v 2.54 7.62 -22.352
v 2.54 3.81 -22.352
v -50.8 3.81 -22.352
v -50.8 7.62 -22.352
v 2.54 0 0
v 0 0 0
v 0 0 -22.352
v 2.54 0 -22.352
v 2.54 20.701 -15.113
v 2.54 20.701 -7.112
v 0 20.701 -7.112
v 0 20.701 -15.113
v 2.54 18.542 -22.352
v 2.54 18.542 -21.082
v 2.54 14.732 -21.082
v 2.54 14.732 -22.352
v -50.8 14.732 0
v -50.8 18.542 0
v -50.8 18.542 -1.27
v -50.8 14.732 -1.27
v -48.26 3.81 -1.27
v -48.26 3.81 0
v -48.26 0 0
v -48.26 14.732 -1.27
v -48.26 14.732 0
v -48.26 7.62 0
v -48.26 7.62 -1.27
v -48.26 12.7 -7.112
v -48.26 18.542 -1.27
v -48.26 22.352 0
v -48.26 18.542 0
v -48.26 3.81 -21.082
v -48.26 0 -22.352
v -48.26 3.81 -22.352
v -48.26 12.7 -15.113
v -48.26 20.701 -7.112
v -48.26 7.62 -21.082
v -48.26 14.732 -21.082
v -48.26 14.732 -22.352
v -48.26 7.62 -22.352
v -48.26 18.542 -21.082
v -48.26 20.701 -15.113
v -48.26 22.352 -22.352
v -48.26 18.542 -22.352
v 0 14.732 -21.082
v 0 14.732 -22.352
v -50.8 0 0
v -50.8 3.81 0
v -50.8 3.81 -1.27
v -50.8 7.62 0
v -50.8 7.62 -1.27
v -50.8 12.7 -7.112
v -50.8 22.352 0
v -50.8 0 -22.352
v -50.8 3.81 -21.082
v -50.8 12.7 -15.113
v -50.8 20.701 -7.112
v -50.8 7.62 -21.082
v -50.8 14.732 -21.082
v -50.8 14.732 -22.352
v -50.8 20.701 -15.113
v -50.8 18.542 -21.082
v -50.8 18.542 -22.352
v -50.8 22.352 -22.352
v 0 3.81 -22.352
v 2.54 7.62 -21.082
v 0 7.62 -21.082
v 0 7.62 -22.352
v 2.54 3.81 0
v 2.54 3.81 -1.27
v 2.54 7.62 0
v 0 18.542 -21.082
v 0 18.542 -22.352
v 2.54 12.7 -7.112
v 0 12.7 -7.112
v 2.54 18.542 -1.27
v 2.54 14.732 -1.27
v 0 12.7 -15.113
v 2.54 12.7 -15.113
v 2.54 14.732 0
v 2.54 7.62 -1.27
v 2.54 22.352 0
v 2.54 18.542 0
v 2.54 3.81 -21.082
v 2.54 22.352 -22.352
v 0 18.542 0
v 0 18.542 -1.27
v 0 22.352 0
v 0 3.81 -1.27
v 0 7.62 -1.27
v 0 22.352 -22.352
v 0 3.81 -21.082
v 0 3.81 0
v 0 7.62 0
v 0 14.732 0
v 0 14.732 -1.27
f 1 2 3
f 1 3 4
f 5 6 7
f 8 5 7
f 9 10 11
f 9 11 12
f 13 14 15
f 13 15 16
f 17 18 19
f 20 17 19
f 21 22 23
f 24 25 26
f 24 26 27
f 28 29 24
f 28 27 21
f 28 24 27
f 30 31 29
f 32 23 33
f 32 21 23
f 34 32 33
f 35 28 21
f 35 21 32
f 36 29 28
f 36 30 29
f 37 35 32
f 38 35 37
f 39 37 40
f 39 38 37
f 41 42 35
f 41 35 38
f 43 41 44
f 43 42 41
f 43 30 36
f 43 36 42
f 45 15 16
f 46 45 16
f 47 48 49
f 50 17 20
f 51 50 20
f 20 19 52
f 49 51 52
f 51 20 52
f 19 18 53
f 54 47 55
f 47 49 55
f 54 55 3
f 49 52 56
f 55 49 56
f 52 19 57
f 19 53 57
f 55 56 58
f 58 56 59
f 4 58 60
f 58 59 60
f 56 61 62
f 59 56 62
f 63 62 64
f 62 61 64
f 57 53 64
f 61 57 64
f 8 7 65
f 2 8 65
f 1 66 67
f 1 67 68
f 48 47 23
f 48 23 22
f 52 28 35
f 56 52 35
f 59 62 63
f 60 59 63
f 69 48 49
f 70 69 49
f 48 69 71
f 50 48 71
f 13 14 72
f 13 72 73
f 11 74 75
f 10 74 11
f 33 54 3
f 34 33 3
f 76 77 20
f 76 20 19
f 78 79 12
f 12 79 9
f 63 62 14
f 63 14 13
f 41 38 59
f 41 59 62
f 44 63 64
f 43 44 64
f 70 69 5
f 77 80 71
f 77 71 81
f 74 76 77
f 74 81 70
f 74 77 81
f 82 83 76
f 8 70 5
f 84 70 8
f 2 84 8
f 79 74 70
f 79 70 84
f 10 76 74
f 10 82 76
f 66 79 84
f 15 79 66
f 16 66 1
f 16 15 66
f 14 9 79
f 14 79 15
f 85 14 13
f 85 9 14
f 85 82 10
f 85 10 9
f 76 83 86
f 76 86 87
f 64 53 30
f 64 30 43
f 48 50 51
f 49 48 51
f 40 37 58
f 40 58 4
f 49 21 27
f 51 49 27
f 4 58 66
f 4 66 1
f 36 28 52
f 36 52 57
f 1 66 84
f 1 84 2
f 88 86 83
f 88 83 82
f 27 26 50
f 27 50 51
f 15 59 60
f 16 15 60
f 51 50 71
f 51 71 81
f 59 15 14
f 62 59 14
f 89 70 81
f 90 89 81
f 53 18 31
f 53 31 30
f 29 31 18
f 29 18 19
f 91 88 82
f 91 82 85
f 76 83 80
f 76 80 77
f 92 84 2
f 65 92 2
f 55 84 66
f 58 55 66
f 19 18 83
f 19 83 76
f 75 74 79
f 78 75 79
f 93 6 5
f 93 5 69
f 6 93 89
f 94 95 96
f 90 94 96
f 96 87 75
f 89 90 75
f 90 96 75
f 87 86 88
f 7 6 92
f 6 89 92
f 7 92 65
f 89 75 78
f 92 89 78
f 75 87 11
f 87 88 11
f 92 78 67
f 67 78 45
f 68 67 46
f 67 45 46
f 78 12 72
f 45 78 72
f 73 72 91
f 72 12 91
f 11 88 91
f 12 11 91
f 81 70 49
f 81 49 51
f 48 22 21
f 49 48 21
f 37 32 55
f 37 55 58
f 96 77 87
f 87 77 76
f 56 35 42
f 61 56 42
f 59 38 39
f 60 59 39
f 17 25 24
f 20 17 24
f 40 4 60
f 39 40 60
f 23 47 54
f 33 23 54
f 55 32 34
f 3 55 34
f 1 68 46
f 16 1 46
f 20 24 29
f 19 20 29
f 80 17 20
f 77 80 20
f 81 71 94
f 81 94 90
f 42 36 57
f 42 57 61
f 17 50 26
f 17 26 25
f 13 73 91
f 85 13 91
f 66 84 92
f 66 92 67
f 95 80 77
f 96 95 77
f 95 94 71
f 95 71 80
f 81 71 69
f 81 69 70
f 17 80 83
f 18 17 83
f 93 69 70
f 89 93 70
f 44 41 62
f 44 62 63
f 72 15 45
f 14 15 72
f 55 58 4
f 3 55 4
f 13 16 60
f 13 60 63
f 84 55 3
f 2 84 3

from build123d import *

# Parameters (mm, degrees)
SKETCH1_W             = 22.352
SKETCH1_H             = 22.352
BOSS_EXTRUDE1_DEPTH   = 2.54
LPATTERN1_COUNT       = 2
LPATTERN1_PITCH       = 50.8
SKETCH2_W             = 8.001
SKETCH2_H             = 8.001
SKETCH2_W_2           = 1.27
SKETCH2_H_2           = 3.81
CUT_EXTRUDE1_DEPTH    = 63.003059666
SKETCH3_W             = 1.27
SKETCH3_H             = 3.81
BOSS_EXTRUDE2_DEPTH   = 53.34
BOSS_EXTRUDE2_2_DEPTH = 53.34
BOSS_EXTRUDE2_3_DEPTH = 53.34
BOSS_EXTRUDE2_4_DEPTH = 53.34


with BuildPart() as part:
    # Sketch1 → Boss-Extrude1 (new body)
    with BuildSketch(Plane(origin=(0, 0, 0), x_dir=(0, 0, -1), z_dir=(1, 0, 0))):
        with Locations((11.176, 11.176)):
            Rectangle(SKETCH1_W, SKETCH1_H)
    extrude(amount=BOSS_EXTRUDE1_DEPTH)


with BuildPart() as lpattern1_1:
    # LPattern1: pattern copy
    add(part.part.moved(Location(Vector(-1, 0, 0) * (1 * LPATTERN1_PITCH))))


with BuildPart() as cut_extrude1_tool:
    # Sketch2 → Cut-Extrude1 (new, through all)
    with BuildSketch(Plane(origin=(2.54, 0, 0), x_dir=(0, 0, -1), z_dir=(1, 0, 0))):
        with Locations((11.1125, 16.7005)):
            Rectangle(SKETCH2_W, SKETCH2_H)
        with Locations((0.635, 16.637)):
            Rectangle(SKETCH2_W_2, SKETCH2_H_2)
        with Locations((21.717, 16.637)):
            Rectangle(SKETCH2_W_2, SKETCH2_H_2)
        with Locations((21.717, 5.715)):
            Rectangle(SKETCH2_W_2, SKETCH2_H_2)
        with Locations((0.635, 5.715)):
            Rectangle(SKETCH2_W_2, SKETCH2_H_2)
    extrude(amount=-CUT_EXTRUDE1_DEPTH)


with BuildPart() as part_1:
    add(part.part)

    # Cut-Extrude1: cut by cut_extrude1_tool
    add(cut_extrude1_tool.part, mode=Mode.SUBTRACT)


with BuildPart() as lpattern1_1_1:
    add(lpattern1_1.part)

    # Cut-Extrude1: cut by cut_extrude1_tool
    add(cut_extrude1_tool.part, mode=Mode.SUBTRACT)


with BuildPart() as body_3:
    # Sketch3 → Boss-Extrude2 (new body)
    with BuildSketch(Plane(origin=(2.54, 0, 0), x_dir=(0, 0, -1), z_dir=(1, 0, 0))):
        with Locations((0.635, 16.637)):
            Rectangle(SKETCH3_W, SKETCH3_H)
    extrude(amount=-BOSS_EXTRUDE2_DEPTH)


with BuildPart() as body_4:
    # Sketch3 → Boss-Extrude2 2 (new body)
    with BuildSketch(Plane(origin=(2.54, 0, 0), x_dir=(0, 0, -1), z_dir=(1, 0, 0))):
        with Locations((0.635, 5.715)):
            Rectangle(SKETCH3_W, SKETCH3_H)
    extrude(amount=-BOSS_EXTRUDE2_2_DEPTH)


with BuildPart() as body_5:
    # Sketch3 → Boss-Extrude2 3 (new body)
    with BuildSketch(Plane(origin=(2.54, 0, 0), x_dir=(0, 0, -1), z_dir=(1, 0, 0))):
        with Locations((21.717, 16.637)):
            Rectangle(SKETCH3_W, SKETCH3_H)
    extrude(amount=-BOSS_EXTRUDE2_3_DEPTH)


with BuildPart() as body_6:
    # Sketch3 → Boss-Extrude2 4 (new body)
    with BuildSketch(Plane(origin=(2.54, 0, 0), x_dir=(0, 0, -1), z_dir=(1, 0, 0))):
        with Locations((21.717, 5.715)):
            Rectangle(SKETCH3_W, SKETCH3_H)
    extrude(amount=-BOSS_EXTRUDE2_4_DEPTH)


solid = Compound([part_1.part, lpattern1_1_1.part, body_3.part, body_4.part, body_5.part, body_6.part])
